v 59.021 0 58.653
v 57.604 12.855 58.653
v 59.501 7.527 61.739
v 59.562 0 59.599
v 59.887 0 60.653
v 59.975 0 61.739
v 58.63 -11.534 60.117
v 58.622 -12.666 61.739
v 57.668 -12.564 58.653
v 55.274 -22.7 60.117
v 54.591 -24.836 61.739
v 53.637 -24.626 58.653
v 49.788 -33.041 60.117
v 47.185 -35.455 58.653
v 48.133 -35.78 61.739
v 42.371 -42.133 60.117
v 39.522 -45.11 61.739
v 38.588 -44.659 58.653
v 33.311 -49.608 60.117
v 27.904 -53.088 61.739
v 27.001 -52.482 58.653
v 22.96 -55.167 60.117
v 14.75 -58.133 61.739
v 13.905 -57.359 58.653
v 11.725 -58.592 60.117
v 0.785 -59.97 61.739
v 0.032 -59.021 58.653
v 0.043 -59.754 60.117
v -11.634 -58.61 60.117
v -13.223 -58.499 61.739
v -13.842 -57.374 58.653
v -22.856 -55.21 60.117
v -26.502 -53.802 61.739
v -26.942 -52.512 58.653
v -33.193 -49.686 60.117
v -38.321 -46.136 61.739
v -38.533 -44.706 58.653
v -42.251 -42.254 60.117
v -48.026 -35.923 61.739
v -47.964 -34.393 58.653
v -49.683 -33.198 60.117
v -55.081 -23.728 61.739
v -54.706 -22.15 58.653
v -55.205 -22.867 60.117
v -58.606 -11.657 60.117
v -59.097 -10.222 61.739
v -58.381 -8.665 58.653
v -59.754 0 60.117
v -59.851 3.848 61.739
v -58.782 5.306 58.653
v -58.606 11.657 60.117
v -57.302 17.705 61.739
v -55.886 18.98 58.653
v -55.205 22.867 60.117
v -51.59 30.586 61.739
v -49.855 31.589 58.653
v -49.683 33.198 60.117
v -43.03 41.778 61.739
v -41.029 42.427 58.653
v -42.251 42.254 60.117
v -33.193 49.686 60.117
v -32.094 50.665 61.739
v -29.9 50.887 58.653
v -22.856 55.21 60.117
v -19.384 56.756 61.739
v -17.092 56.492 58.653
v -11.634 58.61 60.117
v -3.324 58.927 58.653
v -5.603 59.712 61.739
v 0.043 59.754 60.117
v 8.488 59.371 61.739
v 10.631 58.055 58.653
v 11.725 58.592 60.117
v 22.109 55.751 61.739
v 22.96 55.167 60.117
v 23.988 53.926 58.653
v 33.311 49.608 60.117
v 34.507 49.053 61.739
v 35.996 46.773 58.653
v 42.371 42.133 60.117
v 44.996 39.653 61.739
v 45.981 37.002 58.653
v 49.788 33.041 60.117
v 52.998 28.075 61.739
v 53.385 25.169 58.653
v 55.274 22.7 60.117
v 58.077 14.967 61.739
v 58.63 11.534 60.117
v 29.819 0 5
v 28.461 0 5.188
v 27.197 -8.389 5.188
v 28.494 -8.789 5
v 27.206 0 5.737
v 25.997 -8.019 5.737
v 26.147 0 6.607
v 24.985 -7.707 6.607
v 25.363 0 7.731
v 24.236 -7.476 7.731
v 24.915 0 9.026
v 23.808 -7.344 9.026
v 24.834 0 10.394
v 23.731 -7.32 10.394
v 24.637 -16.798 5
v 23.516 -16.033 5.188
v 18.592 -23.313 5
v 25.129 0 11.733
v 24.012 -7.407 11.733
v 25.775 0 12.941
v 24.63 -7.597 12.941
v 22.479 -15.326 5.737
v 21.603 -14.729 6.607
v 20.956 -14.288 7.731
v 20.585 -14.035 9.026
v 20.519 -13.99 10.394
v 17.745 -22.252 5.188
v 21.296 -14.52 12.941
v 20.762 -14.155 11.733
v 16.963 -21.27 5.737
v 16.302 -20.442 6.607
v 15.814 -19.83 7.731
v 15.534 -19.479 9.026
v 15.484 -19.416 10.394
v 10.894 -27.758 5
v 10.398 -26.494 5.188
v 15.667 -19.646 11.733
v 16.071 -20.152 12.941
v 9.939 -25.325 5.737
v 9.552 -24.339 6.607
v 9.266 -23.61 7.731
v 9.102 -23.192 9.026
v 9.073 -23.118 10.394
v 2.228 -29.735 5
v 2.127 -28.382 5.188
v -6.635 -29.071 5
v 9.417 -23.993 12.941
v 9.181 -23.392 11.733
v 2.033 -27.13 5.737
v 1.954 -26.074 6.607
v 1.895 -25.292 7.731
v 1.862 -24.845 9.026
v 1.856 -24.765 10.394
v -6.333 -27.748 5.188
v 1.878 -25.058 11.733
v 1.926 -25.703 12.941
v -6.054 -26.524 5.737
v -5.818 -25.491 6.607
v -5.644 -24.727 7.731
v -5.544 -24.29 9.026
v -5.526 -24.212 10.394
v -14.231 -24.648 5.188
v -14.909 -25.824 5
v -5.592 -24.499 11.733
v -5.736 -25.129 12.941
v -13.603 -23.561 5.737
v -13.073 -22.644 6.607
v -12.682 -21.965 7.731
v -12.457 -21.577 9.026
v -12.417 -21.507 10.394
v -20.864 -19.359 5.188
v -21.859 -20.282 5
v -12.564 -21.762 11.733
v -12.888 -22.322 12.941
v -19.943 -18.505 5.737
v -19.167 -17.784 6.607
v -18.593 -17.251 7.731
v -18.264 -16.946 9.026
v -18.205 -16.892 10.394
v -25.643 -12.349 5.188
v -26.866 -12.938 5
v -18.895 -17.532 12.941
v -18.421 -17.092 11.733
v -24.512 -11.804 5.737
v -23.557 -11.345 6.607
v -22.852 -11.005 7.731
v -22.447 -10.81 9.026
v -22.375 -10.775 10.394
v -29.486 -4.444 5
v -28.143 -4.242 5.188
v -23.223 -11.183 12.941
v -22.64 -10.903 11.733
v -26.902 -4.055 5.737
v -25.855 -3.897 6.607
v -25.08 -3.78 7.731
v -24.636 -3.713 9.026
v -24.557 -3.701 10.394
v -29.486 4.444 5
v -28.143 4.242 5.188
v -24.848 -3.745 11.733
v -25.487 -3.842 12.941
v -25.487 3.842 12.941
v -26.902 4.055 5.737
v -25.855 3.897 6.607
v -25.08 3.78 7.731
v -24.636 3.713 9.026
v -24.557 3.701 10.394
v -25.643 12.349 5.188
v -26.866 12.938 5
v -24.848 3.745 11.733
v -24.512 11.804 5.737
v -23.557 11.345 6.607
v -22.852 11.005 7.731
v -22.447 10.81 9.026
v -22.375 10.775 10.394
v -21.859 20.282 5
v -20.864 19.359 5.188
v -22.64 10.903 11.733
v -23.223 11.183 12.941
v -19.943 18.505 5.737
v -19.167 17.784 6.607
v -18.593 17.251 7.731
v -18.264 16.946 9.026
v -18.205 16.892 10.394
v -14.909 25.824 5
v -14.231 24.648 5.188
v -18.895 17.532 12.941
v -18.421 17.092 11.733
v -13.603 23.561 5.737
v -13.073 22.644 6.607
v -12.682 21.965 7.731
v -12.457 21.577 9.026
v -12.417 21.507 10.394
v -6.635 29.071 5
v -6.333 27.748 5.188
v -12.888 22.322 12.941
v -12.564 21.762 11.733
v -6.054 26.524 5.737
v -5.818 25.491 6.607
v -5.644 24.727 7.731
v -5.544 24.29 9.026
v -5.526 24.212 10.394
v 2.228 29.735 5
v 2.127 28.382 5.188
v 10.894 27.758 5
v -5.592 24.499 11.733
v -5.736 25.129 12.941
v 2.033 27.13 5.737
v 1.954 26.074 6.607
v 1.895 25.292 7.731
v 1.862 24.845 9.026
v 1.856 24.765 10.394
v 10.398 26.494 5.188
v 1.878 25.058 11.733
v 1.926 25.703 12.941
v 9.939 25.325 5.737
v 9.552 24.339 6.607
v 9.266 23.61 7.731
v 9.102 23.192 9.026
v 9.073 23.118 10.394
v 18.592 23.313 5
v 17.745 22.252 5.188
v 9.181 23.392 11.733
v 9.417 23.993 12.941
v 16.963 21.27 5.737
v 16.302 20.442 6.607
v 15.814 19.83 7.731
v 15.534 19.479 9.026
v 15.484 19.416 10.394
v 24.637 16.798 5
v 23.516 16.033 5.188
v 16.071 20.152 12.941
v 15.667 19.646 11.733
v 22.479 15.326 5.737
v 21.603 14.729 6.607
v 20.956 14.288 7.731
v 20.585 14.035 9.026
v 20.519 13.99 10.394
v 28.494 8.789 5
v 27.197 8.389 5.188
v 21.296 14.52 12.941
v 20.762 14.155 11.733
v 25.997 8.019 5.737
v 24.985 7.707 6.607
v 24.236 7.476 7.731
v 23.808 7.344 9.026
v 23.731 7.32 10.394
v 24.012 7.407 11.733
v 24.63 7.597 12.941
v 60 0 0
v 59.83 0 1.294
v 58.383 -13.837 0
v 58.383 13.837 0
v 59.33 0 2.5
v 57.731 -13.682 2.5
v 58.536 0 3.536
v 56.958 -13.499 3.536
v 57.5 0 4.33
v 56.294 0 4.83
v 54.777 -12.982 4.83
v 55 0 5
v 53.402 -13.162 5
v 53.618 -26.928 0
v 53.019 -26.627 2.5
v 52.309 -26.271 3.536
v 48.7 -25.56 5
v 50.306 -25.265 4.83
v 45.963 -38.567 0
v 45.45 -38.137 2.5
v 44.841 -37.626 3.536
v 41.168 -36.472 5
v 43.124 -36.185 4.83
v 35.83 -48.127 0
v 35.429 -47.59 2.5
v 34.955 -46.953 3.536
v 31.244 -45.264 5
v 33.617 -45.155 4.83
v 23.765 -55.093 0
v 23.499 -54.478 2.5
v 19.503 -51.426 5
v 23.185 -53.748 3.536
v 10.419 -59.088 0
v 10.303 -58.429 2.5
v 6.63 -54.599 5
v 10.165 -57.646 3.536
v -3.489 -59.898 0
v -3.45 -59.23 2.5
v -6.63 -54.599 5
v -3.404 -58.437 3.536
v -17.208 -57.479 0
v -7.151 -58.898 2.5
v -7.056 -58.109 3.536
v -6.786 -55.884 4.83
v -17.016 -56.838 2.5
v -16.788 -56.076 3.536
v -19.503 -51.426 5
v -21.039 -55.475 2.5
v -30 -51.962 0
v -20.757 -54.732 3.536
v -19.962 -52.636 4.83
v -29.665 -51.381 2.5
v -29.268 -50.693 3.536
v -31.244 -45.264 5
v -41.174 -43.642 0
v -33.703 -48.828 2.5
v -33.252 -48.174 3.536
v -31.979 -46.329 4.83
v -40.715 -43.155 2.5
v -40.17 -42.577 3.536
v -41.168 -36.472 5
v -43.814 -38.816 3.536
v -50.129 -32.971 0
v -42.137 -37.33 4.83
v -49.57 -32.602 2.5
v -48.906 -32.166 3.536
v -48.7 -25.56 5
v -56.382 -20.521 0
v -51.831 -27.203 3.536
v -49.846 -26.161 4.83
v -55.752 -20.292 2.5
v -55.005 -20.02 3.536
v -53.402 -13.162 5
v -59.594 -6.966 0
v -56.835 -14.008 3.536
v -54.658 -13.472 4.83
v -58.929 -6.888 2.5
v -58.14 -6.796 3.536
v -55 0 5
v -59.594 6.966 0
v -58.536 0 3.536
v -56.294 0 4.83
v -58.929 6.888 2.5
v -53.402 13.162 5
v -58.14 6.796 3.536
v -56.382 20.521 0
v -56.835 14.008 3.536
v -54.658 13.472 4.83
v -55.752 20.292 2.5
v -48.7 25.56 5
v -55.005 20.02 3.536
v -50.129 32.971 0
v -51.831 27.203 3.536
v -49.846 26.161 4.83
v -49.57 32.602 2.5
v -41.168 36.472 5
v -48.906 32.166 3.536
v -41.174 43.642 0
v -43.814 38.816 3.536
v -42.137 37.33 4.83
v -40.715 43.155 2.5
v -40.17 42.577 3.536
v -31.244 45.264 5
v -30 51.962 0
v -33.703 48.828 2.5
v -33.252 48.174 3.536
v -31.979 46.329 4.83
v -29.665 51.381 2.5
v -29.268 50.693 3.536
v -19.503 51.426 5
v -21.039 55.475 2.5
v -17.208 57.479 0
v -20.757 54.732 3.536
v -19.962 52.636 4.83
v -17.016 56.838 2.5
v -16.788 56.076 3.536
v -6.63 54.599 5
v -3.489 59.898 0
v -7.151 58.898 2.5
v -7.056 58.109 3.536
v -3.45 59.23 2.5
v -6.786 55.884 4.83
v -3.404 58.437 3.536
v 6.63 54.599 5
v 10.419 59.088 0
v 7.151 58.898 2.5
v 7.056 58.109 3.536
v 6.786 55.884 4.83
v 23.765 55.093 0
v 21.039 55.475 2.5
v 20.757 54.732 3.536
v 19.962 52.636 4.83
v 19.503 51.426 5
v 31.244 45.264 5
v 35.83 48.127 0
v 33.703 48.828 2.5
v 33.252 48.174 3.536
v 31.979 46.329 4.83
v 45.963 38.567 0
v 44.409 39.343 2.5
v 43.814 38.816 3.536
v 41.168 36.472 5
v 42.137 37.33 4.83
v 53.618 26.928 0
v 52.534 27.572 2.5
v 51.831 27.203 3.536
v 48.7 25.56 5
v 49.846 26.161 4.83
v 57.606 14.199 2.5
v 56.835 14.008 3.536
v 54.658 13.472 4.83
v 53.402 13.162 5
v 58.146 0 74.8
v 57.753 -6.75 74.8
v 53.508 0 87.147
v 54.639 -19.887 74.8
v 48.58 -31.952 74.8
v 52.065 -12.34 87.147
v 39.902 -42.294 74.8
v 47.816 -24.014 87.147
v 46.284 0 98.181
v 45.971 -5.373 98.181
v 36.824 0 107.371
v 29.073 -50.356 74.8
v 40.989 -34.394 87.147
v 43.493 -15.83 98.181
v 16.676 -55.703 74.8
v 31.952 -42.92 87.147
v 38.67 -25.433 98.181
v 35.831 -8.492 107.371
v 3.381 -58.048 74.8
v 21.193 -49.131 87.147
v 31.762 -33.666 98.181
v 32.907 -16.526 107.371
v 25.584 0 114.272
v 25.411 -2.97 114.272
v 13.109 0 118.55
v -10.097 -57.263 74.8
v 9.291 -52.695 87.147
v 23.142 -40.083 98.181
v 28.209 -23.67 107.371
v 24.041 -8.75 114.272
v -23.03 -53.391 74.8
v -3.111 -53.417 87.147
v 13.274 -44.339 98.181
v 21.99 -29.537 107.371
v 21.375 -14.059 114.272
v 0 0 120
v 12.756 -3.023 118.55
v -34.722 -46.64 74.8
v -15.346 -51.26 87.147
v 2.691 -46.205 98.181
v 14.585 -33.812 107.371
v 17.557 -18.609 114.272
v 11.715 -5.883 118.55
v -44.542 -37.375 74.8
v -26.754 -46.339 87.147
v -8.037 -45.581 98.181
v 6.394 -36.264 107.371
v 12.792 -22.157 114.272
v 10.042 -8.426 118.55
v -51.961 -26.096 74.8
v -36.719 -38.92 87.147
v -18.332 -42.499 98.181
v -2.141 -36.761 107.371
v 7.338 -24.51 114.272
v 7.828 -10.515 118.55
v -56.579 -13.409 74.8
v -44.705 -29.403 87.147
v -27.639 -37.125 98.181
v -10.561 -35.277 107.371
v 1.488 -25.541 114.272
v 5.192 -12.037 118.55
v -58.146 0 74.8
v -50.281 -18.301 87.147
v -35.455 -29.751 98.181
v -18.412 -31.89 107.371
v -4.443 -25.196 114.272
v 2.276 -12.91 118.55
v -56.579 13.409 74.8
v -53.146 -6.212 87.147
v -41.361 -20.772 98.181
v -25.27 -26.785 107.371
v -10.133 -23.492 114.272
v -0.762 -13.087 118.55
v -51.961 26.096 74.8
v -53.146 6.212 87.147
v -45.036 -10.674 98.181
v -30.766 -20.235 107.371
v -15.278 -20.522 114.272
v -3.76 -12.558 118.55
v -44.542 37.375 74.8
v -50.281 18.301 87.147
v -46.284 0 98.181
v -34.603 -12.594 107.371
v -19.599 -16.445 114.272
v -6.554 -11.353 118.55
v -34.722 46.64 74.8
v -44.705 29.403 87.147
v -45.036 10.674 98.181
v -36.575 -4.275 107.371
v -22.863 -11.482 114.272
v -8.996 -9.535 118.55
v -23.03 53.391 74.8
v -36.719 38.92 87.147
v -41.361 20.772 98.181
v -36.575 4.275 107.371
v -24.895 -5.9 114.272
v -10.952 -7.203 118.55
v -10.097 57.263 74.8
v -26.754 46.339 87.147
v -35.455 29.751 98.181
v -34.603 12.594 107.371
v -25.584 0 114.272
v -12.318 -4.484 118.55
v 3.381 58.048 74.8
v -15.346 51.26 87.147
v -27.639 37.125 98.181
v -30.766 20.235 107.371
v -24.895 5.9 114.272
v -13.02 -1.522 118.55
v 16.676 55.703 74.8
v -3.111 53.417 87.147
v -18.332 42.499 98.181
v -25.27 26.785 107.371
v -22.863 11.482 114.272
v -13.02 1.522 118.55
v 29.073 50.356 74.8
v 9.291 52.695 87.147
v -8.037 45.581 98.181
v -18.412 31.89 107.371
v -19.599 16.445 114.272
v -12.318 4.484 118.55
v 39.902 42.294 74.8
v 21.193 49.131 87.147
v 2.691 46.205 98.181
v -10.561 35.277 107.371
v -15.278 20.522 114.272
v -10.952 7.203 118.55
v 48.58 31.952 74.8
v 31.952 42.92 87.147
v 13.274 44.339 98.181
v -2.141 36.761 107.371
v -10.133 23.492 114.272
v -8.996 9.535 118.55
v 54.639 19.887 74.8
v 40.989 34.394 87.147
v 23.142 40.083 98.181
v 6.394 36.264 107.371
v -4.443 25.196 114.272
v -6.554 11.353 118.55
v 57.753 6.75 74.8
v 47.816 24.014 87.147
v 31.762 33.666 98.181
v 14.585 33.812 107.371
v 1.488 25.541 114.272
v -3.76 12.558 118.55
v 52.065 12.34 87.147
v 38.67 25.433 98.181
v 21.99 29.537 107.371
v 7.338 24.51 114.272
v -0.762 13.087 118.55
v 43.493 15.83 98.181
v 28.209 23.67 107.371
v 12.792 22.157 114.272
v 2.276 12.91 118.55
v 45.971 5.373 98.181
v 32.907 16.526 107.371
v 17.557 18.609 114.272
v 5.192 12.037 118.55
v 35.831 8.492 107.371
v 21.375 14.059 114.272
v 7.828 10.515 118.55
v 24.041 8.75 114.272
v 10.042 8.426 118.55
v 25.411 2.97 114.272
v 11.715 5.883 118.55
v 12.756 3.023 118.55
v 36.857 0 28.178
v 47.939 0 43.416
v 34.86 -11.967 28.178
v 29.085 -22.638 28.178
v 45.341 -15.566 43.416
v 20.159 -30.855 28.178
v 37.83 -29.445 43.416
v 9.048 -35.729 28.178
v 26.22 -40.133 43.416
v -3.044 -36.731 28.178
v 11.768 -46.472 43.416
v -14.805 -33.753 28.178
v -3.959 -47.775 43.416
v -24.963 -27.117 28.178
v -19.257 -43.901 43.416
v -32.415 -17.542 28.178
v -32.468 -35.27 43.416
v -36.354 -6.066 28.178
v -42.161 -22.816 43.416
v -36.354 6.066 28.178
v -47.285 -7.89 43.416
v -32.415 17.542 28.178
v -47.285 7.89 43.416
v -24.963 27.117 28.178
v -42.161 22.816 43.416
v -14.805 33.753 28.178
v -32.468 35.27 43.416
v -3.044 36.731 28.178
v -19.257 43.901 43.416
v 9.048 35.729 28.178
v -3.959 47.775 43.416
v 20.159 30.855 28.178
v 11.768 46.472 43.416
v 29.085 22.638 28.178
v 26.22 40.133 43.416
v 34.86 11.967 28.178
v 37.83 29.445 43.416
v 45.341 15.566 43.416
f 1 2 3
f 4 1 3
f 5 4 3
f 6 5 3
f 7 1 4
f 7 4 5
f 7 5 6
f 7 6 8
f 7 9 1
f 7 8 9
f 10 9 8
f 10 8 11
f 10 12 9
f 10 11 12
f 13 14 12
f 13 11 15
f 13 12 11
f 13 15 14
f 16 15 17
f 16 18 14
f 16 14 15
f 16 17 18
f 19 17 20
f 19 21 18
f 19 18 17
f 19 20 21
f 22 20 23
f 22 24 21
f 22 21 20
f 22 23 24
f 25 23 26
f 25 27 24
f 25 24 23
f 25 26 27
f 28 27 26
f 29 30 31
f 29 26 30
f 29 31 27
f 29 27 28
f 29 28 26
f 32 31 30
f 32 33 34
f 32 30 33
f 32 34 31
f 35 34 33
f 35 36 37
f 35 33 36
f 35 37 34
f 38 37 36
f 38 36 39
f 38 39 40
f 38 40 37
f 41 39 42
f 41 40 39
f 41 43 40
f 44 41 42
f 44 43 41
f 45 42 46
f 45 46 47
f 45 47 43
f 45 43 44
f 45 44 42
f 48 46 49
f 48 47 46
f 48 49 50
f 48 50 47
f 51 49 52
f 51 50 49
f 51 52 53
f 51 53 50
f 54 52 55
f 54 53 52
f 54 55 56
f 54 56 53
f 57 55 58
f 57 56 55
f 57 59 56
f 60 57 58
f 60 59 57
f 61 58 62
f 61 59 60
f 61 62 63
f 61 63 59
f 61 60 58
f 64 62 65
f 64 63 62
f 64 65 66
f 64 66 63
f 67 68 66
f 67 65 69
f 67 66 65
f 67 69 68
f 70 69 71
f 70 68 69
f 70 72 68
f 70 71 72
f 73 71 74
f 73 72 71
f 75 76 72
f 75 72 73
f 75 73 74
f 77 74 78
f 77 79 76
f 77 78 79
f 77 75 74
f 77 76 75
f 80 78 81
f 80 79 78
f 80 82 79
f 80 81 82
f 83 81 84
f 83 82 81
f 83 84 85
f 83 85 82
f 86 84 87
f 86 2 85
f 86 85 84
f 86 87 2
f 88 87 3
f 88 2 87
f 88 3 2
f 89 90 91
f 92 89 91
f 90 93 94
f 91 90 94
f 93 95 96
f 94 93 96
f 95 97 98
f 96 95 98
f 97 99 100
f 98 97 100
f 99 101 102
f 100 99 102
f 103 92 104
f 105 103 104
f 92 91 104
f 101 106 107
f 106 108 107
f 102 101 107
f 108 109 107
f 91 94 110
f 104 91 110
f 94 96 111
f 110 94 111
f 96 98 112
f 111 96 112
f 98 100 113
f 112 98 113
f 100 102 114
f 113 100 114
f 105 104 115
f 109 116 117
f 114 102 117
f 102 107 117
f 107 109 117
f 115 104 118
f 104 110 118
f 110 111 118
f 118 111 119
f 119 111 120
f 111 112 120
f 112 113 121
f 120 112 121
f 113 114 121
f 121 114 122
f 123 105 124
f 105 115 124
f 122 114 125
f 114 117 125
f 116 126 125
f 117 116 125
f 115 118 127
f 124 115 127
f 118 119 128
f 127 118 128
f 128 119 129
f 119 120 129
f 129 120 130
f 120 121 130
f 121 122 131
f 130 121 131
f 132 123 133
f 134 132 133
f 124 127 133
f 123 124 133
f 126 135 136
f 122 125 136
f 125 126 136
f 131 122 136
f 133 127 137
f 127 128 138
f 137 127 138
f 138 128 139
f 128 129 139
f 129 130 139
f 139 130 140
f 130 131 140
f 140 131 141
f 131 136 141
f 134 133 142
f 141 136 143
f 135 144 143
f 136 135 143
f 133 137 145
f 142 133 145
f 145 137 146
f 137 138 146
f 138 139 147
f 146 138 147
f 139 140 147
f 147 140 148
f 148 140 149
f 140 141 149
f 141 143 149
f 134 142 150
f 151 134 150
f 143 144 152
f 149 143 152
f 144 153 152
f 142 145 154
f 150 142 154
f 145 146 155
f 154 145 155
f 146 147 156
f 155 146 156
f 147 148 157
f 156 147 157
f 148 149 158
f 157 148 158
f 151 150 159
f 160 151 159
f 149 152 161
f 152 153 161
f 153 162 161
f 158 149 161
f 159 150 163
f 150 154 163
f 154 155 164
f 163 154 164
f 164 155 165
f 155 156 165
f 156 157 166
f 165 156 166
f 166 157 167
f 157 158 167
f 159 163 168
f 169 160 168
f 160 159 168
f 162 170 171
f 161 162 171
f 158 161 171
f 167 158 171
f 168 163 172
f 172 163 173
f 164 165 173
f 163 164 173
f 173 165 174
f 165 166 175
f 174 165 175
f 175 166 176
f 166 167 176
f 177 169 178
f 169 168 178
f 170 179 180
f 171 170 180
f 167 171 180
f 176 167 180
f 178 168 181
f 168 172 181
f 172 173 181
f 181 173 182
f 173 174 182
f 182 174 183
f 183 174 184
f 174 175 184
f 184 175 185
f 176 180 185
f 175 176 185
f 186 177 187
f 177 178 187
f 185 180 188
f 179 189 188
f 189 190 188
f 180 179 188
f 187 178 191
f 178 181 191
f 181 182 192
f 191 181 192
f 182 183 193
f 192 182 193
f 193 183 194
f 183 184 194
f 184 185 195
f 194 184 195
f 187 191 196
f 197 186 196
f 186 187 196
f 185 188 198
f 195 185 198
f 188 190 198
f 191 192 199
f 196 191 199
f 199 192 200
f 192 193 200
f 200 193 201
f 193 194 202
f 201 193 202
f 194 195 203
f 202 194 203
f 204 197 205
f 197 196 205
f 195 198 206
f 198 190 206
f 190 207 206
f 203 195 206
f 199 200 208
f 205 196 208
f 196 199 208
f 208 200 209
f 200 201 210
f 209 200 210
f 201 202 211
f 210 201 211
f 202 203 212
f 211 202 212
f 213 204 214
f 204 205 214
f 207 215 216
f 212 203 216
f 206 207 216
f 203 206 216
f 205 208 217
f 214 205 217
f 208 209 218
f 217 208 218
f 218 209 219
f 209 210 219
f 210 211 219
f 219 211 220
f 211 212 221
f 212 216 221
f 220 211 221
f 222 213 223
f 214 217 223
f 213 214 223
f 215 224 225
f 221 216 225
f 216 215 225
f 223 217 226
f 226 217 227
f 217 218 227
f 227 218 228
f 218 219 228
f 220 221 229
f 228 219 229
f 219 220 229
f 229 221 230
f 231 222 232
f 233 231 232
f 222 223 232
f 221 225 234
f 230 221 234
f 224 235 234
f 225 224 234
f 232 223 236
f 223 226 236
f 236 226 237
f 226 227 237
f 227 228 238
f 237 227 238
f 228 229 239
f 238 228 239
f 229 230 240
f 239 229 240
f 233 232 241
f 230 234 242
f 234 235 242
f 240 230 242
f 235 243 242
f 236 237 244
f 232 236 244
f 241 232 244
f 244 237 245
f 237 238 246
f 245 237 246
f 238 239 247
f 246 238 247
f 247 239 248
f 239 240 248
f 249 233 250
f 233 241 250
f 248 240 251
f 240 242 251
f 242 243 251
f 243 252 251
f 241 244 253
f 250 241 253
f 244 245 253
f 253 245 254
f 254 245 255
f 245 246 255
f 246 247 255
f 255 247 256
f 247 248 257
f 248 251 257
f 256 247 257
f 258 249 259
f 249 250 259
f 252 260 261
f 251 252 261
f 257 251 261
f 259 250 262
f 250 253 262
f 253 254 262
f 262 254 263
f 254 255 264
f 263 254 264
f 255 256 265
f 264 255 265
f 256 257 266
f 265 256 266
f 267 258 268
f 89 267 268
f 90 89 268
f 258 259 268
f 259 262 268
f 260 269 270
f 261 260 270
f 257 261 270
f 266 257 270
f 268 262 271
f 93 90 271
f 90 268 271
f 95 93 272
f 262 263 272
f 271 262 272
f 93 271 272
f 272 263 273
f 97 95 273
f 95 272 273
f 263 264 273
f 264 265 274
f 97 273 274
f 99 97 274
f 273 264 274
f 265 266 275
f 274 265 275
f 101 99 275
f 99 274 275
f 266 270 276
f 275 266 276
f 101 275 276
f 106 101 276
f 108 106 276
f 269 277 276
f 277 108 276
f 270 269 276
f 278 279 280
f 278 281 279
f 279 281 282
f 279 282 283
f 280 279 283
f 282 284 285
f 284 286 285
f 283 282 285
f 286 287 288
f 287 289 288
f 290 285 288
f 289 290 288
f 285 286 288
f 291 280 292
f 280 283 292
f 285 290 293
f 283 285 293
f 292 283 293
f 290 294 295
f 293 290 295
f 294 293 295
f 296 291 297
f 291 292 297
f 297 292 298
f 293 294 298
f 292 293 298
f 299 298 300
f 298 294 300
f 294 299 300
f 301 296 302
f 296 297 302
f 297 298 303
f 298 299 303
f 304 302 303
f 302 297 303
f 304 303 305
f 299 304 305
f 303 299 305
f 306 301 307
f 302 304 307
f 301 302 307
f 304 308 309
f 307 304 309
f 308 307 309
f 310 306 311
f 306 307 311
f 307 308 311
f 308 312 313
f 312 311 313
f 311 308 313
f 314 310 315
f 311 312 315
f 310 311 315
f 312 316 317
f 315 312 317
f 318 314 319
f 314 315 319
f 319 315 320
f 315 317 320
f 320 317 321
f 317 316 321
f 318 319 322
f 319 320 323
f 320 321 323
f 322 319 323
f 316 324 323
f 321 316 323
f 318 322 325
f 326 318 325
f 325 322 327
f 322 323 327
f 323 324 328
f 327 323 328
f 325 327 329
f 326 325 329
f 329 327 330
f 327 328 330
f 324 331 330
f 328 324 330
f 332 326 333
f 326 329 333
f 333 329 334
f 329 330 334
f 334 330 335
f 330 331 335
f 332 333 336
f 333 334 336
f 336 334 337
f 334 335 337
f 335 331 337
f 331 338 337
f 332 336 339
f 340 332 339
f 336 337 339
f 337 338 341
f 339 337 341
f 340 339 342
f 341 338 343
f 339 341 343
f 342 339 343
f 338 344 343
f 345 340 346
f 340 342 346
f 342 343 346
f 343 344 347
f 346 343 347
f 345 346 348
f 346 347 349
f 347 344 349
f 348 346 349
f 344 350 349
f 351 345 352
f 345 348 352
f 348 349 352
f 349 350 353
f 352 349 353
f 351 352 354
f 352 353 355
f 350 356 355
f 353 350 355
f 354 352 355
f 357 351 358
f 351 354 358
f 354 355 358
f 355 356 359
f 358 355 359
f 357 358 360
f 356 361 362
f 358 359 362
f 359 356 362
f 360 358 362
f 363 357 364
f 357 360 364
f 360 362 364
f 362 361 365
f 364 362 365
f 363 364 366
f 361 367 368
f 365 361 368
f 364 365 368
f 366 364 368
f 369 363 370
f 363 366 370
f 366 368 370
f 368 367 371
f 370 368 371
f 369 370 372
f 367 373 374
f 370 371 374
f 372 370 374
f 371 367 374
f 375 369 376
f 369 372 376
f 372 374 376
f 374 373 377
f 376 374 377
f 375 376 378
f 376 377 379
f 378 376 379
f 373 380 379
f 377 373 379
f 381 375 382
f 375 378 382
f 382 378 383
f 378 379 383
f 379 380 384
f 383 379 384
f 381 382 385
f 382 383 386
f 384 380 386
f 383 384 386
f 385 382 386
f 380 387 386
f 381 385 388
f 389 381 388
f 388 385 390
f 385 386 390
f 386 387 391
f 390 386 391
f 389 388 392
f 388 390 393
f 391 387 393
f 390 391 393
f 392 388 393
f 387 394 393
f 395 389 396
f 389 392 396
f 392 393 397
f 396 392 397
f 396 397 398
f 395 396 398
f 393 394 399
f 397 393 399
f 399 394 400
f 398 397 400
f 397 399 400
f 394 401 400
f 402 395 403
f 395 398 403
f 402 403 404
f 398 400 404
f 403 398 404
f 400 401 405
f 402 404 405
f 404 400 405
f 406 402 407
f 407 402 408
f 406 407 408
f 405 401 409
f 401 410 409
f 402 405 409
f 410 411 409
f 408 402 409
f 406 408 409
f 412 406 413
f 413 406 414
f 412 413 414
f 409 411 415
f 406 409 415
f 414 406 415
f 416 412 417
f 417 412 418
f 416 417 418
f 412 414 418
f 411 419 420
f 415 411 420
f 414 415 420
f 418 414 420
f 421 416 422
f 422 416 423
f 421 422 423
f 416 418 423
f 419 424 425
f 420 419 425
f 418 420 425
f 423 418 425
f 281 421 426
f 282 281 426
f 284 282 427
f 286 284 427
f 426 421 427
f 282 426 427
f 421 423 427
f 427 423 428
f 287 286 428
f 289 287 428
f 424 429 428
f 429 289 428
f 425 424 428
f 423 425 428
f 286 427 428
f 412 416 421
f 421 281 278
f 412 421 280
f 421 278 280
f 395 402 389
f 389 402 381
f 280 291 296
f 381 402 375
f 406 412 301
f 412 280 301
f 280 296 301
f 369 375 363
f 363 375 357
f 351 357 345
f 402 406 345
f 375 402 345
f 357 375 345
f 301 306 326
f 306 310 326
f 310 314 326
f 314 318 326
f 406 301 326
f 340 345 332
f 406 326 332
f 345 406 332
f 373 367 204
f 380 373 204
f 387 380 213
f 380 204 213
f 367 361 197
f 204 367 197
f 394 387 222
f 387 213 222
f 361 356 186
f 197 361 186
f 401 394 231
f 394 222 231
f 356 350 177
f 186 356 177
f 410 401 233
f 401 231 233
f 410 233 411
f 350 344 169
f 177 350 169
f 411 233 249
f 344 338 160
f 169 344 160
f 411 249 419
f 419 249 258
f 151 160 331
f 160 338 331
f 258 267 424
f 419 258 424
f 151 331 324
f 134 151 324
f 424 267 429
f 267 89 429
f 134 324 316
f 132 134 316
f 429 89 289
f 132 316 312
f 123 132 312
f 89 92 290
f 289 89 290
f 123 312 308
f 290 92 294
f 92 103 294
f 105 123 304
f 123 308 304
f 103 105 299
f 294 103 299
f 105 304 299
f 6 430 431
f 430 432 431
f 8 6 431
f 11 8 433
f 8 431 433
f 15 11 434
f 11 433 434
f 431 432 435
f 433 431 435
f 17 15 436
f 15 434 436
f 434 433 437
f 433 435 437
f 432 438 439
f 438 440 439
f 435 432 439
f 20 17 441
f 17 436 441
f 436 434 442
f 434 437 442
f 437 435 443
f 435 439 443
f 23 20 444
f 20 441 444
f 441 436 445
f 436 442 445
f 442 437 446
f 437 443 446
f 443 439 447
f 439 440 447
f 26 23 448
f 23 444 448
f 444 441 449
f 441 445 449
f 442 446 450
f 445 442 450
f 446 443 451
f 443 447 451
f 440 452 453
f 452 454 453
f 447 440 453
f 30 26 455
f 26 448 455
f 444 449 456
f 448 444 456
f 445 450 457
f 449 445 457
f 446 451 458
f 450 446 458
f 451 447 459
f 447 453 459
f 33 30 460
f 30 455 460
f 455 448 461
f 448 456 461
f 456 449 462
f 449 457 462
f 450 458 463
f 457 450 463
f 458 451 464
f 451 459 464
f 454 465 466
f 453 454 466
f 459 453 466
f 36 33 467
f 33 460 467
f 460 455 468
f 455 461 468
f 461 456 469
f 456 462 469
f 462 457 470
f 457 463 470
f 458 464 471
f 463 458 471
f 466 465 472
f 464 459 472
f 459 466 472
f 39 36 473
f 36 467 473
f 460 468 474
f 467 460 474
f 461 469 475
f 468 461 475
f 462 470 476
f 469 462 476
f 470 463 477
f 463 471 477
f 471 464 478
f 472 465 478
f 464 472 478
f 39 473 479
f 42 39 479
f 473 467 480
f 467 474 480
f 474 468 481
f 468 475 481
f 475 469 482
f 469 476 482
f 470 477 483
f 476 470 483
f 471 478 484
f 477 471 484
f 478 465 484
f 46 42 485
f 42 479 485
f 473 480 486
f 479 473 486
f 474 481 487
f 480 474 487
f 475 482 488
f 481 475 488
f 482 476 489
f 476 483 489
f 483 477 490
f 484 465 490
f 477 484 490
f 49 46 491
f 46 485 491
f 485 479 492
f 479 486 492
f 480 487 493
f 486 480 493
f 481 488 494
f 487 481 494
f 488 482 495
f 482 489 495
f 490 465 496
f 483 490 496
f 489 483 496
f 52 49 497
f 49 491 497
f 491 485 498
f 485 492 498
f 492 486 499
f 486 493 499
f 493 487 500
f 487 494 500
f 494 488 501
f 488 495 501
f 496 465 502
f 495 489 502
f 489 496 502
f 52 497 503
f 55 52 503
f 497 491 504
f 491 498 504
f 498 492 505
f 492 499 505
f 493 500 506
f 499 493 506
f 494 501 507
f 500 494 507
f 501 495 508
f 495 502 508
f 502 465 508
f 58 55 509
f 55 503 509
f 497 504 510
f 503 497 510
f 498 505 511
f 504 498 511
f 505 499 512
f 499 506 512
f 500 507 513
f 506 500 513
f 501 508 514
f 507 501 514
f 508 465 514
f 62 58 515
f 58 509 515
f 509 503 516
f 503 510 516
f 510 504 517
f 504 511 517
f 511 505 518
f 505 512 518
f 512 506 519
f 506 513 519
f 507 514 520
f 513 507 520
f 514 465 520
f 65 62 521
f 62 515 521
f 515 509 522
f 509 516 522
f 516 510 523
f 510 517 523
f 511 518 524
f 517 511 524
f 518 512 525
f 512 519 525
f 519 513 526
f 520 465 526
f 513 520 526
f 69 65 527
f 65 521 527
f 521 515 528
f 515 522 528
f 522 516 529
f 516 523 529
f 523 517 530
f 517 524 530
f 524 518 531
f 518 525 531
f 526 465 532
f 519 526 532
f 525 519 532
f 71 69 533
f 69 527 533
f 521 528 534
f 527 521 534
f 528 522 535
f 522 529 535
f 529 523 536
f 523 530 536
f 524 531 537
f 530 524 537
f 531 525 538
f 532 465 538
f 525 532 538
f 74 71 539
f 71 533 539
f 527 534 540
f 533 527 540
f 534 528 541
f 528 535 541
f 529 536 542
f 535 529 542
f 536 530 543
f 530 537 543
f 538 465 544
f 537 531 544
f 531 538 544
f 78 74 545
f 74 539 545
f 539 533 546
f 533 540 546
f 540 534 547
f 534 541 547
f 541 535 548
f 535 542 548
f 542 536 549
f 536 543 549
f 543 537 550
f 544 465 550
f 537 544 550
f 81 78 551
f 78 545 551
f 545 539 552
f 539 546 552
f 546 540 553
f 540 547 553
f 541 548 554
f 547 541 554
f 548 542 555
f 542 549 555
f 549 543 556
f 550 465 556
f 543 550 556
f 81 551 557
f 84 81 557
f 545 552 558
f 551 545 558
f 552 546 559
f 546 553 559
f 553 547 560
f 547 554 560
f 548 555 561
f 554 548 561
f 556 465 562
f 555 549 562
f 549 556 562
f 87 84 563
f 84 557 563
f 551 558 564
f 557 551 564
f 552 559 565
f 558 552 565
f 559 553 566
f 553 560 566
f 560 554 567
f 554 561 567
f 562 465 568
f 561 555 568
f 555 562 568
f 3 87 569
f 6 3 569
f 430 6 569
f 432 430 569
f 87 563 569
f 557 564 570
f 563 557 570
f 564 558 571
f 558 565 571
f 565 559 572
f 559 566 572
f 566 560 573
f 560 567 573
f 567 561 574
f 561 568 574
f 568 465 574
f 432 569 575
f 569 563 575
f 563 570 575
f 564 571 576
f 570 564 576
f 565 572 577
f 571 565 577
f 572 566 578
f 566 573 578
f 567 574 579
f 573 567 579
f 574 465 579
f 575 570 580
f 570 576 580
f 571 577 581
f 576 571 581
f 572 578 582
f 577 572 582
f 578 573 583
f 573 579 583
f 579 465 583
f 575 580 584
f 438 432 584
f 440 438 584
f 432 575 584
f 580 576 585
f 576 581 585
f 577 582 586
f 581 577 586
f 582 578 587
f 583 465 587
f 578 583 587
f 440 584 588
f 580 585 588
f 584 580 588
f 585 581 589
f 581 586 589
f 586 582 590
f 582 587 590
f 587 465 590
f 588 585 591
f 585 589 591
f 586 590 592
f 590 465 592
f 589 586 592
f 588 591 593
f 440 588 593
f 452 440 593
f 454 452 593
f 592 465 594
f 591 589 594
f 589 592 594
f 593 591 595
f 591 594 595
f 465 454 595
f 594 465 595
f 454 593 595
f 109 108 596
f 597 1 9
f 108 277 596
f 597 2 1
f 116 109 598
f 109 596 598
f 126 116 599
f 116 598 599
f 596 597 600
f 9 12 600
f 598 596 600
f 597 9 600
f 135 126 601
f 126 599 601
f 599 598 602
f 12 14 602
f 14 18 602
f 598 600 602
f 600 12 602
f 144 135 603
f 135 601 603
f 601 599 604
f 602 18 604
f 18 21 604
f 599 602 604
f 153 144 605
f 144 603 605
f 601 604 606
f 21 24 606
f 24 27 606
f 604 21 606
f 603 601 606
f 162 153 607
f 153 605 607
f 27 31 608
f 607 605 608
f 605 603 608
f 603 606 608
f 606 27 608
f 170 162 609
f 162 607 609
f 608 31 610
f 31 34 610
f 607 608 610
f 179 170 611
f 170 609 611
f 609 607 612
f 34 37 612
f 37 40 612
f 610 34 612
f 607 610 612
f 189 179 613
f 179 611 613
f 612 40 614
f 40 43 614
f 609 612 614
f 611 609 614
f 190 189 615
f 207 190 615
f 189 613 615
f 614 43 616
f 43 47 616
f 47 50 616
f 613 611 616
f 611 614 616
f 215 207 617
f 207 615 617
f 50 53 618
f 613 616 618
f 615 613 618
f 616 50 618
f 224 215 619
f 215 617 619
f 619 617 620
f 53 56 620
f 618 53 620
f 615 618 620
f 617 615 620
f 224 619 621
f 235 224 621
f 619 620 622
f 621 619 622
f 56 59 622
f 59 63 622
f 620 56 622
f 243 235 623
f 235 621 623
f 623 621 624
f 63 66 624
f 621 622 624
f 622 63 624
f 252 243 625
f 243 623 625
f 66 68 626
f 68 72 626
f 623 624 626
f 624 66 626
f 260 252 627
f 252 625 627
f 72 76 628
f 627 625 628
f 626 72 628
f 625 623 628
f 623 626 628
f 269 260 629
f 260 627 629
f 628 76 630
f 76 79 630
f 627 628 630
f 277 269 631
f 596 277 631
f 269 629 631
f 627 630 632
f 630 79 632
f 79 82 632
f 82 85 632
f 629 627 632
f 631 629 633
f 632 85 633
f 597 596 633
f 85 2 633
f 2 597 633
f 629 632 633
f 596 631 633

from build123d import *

# Parameters (mm, degrees)
F2_R = 4.99999
F3_R = 5


# Not quite as in the source:
# - a fillet or chamfer is up to 0.001 mm smaller than in the source, because OpenCascade refuses the exact size


with BuildPart() as f1:
    # F0 (on Front) → F1 (revolve)
    with BuildSketch(Plane.XZ):
        with BuildLine():
            Line((0, 120), (0, 0))
            Line((0, 0), (60, 0))
            Line((60, 0), (60, 5))
            Line((60, 5), (20, 5))
            Line((20, 5), (60, 60))
            ThreePointArc((60, 60), (42.4264068712, 102.4264068712), (0, 120))
        make_face()
    revolve(axis=Axis((0, 0, 60), (0, 0, -1)))

    # F2 (radius 5 in the source; OpenCascade refuses exactly that, so slightly less here)
    f2_edges = [f1.edges().sort_by_distance(p)[0] for p in [
        (-60, 0, 5),
        (-20, 0, 5),
    ]]
    fillet(f2_edges, radius=F2_R)

    # F3
    f3_edges = [f1.edges().sort_by_distance(p)[0] for p in [
        (-60, 0, 60),
    ]]
    fillet(f3_edges, radius=F3_R)


solid = f1.part
